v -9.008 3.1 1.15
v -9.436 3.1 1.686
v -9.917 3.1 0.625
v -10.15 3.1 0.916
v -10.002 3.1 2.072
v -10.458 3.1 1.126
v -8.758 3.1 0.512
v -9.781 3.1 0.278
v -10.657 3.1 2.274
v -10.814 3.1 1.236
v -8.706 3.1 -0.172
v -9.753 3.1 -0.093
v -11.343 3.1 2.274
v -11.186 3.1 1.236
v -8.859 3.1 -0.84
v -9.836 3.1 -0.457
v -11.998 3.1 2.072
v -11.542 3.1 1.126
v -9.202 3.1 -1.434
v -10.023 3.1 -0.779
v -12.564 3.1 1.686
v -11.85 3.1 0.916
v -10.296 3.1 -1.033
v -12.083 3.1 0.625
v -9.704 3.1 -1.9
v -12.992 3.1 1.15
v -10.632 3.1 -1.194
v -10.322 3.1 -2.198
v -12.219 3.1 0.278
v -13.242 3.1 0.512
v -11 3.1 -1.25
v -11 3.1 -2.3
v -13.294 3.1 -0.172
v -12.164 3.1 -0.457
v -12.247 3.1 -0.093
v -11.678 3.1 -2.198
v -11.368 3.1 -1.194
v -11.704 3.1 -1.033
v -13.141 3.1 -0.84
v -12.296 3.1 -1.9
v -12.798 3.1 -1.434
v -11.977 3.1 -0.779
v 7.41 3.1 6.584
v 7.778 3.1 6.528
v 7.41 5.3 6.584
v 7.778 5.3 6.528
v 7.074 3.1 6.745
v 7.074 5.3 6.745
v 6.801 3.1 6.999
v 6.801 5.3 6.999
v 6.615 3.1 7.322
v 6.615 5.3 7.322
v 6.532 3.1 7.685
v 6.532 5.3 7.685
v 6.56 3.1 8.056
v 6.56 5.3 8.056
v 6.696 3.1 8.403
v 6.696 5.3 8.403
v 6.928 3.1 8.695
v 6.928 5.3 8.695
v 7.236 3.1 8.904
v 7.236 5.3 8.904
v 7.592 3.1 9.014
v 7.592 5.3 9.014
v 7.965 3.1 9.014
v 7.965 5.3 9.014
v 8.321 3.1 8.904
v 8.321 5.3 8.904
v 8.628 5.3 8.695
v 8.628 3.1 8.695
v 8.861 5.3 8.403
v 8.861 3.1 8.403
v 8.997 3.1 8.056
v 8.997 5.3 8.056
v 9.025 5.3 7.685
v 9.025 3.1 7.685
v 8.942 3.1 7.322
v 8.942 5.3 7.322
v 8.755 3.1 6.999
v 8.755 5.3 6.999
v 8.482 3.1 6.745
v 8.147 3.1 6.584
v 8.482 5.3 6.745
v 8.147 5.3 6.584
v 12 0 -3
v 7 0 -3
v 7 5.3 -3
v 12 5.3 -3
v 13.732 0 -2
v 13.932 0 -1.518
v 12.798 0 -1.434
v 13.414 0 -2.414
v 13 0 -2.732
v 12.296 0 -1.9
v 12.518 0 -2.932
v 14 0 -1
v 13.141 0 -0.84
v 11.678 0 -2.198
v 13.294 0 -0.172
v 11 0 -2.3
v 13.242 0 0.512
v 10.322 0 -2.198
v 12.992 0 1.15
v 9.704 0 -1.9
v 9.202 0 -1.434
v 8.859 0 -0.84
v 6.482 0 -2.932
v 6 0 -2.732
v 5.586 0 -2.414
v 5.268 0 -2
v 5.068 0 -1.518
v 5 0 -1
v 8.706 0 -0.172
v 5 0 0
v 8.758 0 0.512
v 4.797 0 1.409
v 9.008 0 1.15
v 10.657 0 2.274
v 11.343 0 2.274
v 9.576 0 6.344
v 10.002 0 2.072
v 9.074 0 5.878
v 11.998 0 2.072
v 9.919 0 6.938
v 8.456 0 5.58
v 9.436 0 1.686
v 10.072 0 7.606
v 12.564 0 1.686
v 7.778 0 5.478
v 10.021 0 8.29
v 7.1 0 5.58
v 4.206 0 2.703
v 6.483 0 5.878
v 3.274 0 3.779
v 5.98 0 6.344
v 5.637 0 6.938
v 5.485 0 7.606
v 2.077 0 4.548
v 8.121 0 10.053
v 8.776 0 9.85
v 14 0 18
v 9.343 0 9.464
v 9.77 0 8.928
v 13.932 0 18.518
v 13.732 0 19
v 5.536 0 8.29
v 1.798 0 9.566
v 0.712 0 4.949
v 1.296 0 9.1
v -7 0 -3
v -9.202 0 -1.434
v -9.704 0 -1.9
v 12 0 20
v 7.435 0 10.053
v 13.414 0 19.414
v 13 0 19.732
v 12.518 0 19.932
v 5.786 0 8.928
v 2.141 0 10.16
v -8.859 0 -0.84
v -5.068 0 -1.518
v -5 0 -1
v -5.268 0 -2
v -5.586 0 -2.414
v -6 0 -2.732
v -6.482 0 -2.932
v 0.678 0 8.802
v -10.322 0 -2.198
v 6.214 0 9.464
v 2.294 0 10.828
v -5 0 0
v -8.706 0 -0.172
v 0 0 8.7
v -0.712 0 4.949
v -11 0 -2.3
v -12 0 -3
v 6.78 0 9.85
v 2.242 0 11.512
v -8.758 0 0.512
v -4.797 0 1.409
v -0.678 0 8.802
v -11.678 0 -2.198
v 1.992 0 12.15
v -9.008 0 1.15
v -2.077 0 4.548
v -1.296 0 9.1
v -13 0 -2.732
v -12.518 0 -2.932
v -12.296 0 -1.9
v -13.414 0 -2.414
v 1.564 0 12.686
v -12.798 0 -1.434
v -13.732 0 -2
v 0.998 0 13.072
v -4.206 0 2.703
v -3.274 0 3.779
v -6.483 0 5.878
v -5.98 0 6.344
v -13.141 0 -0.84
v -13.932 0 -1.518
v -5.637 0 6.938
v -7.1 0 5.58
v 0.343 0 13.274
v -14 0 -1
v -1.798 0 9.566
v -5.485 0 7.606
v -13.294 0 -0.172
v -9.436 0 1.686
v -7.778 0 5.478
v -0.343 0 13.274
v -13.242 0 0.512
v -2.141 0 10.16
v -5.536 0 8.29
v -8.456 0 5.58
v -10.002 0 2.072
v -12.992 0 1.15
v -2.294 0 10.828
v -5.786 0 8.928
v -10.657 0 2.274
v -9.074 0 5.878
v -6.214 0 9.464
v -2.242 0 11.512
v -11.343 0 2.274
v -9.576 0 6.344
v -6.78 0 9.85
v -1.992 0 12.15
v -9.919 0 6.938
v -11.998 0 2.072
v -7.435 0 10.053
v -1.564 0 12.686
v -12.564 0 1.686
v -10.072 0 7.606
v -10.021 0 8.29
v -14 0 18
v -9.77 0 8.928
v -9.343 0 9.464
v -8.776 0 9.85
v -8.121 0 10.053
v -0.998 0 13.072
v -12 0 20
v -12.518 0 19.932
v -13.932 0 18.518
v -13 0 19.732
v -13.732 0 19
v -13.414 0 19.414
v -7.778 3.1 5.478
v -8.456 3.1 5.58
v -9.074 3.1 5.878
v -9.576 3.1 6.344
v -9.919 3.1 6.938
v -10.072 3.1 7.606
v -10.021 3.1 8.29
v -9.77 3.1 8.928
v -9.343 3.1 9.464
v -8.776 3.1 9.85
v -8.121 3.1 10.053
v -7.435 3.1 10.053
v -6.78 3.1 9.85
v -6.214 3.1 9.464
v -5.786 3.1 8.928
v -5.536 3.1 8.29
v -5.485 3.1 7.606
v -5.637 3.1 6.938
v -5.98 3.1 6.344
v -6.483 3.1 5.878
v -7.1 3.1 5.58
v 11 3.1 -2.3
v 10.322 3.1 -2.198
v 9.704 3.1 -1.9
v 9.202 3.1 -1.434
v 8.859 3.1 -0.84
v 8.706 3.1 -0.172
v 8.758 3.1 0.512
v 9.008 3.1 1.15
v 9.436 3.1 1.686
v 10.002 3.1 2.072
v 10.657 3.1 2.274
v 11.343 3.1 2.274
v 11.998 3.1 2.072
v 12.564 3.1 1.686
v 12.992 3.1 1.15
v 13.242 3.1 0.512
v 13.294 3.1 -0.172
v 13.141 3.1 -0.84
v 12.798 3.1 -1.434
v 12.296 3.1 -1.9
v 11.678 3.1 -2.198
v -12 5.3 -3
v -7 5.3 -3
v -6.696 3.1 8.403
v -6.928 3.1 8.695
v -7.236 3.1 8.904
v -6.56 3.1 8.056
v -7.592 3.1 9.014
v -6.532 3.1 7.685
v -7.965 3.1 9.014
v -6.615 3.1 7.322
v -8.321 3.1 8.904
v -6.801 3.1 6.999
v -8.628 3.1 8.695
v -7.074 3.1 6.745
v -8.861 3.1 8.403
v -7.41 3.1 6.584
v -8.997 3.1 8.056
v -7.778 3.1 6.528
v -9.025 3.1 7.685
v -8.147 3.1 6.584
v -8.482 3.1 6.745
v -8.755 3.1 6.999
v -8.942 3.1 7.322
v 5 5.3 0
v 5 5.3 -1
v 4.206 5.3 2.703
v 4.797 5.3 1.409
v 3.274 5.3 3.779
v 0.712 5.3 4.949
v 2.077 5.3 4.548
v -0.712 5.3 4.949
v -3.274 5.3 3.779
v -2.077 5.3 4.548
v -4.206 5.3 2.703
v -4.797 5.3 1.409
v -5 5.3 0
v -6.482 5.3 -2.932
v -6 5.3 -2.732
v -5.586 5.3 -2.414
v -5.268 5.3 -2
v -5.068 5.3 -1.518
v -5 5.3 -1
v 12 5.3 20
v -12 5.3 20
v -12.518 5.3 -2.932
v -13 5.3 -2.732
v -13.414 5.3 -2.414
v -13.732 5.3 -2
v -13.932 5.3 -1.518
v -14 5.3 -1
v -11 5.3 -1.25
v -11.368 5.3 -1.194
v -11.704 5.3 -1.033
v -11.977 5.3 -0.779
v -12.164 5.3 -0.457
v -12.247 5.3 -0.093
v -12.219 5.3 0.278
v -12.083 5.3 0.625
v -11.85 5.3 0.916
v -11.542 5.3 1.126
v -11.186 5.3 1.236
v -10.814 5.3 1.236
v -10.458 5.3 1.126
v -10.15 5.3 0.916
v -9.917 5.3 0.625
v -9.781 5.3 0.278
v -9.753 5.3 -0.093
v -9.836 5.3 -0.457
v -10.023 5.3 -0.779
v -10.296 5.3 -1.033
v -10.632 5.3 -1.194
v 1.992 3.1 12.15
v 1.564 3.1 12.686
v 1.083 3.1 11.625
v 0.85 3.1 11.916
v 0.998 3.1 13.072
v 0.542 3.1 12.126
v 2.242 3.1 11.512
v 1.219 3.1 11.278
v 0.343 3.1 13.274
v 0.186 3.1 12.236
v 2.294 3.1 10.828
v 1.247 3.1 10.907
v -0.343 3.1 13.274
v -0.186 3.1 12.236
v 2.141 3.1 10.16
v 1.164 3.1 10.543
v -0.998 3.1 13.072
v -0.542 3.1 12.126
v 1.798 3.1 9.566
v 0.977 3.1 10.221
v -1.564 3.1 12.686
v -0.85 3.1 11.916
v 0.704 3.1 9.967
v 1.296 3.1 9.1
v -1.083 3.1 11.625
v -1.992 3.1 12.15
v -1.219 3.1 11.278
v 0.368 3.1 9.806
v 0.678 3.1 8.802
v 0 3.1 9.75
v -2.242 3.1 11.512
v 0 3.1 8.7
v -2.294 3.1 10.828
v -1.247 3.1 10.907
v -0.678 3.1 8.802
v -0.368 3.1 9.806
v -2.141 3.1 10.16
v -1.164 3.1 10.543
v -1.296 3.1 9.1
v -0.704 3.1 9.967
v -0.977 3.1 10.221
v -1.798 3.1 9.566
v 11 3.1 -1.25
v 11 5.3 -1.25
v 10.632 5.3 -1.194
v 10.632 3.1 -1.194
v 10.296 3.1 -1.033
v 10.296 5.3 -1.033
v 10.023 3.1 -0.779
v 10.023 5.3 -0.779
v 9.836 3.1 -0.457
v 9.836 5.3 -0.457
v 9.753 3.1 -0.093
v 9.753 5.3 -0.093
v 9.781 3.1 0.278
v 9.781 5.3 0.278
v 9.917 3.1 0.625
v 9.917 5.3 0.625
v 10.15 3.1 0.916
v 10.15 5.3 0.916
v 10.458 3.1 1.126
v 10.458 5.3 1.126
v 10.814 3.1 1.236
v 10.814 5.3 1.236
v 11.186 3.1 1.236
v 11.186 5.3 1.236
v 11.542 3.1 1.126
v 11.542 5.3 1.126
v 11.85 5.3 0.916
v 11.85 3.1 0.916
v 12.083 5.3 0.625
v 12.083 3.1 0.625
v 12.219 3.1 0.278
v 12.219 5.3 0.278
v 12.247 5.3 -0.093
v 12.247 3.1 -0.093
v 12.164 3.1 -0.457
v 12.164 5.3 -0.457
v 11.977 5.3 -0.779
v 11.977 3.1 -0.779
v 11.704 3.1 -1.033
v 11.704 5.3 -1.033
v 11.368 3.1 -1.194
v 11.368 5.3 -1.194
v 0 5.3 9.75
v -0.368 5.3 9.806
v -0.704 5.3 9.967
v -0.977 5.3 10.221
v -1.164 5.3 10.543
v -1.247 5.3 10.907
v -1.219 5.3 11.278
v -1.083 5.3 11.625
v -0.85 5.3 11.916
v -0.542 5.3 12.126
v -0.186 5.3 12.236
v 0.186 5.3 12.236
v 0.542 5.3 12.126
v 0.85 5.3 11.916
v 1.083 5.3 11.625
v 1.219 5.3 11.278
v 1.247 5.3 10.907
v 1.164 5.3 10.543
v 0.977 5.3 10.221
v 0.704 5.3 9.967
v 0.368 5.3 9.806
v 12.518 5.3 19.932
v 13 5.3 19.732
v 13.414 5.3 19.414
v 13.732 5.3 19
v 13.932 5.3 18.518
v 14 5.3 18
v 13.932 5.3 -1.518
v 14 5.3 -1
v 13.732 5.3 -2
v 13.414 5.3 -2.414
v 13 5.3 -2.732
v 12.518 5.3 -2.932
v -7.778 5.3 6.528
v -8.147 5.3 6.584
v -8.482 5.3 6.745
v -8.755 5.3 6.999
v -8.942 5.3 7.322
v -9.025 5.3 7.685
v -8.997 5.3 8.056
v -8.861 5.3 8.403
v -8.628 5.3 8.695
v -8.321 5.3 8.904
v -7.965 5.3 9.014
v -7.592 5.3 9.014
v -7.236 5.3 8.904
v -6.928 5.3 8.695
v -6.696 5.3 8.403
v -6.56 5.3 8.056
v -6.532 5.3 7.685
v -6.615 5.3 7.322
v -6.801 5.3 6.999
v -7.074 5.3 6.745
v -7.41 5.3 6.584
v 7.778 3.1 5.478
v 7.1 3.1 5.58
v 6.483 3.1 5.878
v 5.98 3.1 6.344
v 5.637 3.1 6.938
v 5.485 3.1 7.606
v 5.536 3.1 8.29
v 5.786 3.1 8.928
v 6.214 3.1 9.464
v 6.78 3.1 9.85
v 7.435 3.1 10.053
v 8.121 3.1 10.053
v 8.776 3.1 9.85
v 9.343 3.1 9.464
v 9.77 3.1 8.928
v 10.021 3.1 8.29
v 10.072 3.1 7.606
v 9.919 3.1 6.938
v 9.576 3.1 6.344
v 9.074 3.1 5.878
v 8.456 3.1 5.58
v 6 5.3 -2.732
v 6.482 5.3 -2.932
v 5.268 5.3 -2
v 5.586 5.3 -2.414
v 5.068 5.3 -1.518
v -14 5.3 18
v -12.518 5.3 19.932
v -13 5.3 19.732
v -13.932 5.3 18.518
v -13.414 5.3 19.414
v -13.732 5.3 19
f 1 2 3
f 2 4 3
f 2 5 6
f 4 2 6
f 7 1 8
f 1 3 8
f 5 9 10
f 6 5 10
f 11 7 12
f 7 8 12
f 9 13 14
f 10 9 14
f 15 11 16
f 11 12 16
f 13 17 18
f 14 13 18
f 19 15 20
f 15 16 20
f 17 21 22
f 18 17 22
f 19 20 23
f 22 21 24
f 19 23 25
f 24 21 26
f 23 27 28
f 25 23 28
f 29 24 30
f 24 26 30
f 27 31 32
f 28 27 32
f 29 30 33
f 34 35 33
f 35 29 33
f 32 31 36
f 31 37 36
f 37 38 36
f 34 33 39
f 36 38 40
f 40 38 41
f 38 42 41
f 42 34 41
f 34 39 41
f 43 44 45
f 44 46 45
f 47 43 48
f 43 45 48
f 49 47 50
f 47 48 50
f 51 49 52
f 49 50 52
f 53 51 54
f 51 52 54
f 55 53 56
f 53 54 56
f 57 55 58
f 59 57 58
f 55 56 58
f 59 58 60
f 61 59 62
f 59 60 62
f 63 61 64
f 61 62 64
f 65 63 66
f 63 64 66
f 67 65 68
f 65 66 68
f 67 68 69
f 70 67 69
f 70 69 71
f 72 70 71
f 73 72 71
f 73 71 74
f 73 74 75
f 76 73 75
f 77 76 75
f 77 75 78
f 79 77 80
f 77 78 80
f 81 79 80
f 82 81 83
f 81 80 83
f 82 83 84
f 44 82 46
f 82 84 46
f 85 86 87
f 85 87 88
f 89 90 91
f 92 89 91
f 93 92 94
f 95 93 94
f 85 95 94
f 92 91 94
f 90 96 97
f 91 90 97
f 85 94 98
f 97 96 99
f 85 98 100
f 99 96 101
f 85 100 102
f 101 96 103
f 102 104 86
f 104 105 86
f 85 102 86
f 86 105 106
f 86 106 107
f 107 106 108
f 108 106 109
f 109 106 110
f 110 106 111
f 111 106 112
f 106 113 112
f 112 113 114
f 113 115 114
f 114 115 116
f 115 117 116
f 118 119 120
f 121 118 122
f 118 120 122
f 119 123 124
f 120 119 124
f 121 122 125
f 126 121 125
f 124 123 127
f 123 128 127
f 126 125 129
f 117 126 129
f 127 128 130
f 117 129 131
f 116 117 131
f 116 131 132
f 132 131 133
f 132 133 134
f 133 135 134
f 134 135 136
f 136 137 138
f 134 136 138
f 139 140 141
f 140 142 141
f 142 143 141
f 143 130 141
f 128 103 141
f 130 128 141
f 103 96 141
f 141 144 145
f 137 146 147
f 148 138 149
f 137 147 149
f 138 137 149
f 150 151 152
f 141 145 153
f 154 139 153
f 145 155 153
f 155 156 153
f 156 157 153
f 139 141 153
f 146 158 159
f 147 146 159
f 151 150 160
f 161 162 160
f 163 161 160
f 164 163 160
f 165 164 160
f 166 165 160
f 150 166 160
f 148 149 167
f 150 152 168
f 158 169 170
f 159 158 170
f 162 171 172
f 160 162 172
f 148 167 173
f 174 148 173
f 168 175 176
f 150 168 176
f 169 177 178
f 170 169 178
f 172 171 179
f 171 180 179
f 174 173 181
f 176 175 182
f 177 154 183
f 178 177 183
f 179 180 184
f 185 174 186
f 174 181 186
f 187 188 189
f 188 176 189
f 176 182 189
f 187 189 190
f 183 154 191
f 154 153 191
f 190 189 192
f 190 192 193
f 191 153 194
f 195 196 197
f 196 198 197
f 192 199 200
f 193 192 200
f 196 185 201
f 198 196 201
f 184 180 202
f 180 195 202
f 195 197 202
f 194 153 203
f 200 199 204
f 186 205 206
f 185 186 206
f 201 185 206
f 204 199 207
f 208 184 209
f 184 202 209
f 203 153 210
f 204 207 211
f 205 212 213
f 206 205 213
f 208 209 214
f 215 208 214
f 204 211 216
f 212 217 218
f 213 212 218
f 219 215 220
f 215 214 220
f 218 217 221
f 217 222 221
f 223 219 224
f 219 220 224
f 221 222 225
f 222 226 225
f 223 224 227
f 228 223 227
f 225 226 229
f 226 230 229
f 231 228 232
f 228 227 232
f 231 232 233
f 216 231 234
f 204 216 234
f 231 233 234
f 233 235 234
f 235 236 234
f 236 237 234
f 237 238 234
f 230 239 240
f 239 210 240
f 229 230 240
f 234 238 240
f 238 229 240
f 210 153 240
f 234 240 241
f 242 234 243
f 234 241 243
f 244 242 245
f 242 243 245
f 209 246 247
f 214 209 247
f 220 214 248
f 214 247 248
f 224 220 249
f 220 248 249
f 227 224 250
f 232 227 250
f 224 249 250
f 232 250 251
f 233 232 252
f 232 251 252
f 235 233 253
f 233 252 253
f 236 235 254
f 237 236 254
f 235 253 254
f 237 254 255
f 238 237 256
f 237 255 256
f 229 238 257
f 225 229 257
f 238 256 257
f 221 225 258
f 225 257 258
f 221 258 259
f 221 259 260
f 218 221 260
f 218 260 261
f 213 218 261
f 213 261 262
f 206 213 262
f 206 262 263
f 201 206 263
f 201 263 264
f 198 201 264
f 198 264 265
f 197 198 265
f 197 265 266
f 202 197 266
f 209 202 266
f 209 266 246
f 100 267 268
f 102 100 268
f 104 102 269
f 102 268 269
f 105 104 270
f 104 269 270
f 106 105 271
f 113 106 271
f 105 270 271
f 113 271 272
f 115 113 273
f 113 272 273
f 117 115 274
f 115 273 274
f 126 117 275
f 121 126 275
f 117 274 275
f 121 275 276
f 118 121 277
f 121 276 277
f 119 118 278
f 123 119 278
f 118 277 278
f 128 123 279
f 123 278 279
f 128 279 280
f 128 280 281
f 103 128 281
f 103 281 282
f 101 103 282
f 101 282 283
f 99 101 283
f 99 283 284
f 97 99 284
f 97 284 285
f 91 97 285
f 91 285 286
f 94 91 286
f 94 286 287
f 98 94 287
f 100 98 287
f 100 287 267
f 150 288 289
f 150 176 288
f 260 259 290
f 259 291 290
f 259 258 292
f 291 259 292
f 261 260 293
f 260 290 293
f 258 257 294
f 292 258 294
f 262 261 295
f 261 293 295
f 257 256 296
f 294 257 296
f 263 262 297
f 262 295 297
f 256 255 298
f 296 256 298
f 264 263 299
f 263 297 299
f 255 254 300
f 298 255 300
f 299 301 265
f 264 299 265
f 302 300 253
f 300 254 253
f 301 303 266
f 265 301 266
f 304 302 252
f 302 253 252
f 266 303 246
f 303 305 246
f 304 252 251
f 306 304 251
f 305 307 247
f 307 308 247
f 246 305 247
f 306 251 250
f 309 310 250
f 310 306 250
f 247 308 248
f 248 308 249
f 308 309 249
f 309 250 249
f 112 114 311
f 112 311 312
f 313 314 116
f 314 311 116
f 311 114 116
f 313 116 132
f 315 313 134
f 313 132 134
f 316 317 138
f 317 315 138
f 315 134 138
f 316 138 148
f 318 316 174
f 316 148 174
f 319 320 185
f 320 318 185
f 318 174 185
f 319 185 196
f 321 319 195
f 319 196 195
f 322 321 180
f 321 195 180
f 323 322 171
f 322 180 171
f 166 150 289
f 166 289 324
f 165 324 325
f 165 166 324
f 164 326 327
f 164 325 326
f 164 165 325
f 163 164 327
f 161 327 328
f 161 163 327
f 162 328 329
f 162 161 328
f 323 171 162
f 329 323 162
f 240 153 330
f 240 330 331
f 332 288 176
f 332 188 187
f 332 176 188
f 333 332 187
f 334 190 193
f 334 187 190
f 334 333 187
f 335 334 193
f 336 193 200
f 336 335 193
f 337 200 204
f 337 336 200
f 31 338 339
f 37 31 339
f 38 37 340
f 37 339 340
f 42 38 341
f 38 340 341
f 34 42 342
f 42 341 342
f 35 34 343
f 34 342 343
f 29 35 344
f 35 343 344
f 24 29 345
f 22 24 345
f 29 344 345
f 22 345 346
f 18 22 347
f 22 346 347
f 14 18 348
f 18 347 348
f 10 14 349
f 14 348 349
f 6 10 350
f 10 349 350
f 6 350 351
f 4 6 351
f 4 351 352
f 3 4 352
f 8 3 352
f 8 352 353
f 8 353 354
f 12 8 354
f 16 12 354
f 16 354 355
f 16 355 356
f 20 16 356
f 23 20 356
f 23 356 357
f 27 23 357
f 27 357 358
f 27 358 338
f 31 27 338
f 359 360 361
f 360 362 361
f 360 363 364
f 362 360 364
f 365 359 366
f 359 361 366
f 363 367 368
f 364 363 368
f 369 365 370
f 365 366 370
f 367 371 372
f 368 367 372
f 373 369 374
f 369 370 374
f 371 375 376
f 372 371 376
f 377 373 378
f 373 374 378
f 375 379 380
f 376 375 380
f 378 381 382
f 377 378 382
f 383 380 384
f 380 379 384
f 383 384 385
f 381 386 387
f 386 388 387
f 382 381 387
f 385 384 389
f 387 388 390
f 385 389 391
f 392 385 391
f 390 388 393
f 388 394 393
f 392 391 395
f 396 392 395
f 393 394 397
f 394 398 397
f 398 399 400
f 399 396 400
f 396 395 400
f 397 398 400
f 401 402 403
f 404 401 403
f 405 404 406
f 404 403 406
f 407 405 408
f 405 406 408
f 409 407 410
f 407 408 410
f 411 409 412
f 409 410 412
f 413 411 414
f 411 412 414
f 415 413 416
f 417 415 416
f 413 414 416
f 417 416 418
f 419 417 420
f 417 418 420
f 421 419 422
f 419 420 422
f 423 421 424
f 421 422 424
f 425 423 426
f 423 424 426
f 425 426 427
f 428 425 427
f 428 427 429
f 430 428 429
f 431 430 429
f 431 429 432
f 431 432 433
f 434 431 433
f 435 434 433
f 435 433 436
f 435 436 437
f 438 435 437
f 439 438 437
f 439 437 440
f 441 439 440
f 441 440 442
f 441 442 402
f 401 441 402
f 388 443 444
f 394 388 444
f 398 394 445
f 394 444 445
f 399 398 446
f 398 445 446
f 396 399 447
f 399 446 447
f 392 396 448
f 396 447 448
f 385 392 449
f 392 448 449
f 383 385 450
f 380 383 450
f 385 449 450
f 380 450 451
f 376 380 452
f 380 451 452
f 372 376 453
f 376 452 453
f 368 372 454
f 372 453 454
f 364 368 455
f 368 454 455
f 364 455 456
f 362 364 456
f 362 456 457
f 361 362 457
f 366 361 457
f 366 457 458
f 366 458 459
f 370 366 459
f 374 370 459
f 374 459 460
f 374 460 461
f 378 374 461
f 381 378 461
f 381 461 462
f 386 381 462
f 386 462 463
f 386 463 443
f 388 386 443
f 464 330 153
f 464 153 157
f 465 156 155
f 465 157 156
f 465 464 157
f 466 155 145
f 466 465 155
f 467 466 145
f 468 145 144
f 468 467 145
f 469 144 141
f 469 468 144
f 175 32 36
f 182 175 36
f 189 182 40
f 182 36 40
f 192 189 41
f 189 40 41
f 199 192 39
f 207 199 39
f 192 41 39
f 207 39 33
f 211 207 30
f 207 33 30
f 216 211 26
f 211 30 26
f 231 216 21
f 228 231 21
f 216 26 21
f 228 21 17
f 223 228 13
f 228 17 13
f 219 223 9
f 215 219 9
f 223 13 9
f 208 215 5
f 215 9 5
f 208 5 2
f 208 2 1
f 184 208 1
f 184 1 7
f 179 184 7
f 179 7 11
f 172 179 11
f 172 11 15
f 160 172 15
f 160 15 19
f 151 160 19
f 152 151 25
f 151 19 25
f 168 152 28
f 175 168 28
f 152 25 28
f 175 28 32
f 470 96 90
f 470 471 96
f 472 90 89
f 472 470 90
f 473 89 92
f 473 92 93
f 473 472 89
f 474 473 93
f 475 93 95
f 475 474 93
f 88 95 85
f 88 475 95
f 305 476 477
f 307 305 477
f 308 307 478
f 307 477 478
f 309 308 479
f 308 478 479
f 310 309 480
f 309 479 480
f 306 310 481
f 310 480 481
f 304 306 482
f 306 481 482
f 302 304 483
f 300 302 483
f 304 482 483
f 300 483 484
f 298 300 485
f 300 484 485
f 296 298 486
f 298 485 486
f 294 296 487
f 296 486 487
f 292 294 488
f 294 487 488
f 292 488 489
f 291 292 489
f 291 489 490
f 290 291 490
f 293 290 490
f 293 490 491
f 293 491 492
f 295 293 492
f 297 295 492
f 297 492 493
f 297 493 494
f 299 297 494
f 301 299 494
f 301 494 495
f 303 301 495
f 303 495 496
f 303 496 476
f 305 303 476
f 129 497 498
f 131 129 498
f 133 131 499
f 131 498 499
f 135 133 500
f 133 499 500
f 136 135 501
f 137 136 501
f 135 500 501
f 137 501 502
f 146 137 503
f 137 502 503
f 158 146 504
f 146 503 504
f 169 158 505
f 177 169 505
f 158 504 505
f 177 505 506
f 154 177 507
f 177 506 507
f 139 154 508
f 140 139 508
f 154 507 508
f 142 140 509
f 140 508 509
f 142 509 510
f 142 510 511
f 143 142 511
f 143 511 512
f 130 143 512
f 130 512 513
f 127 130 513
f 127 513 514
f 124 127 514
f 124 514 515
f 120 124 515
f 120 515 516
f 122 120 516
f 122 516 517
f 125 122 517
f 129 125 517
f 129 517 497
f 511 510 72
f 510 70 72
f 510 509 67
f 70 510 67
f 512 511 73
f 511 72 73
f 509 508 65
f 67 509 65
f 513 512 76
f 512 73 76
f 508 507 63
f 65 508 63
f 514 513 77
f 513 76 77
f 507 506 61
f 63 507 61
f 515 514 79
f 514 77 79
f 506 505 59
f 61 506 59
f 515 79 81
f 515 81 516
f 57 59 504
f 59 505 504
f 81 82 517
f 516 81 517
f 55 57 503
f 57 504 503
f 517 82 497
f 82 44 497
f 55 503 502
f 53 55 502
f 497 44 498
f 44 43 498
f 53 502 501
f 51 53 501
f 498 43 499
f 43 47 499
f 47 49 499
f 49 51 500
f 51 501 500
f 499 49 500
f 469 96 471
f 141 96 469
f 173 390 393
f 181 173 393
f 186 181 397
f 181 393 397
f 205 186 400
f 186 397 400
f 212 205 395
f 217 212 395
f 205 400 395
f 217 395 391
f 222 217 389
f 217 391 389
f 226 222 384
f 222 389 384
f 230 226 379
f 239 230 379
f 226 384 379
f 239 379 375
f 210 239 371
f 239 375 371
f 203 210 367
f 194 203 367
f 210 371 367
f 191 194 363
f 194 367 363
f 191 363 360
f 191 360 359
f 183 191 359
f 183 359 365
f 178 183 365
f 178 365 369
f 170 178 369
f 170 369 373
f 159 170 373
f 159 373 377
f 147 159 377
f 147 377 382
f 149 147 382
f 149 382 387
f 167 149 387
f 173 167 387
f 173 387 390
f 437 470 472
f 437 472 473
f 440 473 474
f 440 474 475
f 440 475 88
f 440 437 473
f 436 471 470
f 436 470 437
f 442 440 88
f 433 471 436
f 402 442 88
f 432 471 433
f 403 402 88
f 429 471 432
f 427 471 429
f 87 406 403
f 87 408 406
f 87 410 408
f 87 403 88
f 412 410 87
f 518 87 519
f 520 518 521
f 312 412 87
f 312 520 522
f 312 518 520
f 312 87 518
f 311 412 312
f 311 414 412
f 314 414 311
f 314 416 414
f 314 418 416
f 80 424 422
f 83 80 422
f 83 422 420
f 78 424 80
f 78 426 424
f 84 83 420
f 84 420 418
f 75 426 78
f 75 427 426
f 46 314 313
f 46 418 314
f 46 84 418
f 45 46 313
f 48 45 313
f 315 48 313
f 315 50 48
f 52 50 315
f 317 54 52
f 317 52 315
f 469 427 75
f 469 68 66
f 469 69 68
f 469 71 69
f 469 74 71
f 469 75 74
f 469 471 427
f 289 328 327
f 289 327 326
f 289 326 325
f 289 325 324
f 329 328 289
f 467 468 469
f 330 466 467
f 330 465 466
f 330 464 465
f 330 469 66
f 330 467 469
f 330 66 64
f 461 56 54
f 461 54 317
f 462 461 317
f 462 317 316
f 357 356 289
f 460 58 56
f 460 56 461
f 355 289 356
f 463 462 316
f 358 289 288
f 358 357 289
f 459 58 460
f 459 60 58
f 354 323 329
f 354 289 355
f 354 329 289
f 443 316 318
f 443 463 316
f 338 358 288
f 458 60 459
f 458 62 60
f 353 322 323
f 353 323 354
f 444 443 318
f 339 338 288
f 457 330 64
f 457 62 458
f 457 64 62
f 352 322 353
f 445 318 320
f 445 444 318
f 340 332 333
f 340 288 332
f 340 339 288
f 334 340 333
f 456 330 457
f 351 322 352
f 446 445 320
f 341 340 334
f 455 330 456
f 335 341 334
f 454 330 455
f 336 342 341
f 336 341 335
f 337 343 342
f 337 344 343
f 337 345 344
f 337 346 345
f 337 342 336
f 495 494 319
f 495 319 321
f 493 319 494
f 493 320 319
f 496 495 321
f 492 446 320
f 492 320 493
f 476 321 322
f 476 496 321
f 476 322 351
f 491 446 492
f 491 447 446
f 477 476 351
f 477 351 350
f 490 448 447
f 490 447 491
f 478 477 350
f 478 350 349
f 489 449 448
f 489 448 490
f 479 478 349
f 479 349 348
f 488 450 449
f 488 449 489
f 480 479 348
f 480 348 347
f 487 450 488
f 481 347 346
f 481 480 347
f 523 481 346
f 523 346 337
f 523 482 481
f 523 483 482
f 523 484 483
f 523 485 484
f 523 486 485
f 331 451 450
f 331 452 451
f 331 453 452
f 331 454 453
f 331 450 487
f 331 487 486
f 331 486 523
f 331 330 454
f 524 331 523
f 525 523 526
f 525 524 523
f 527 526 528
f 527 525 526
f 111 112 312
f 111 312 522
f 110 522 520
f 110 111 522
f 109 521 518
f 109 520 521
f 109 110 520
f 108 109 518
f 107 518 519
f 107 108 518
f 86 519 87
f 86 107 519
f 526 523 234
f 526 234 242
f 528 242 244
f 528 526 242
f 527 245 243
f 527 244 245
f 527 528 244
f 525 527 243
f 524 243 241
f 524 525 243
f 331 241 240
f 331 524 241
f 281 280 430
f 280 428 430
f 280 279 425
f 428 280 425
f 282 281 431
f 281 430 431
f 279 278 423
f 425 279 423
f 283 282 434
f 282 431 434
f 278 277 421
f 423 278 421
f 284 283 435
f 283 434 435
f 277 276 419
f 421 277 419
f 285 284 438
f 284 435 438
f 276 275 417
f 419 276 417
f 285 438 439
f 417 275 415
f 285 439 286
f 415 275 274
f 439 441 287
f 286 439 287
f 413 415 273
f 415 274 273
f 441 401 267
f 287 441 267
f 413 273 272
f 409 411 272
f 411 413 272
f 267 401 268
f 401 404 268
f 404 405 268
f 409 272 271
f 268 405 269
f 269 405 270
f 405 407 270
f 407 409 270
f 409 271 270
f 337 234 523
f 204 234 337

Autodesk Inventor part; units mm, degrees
ref_plane "YZ Plane" through (0, 0, 0) normal (1, 0, 0) x (0, 1, 0)
ref_plane "XZ Plane" through (0, 0, 0) normal (0, 1, 0) x (-1, 0, 0)
ref_plane "XY Plane" through (0, 0, 0) normal (0, 0, 1) x (1, 0, 0)
sketch "Sketch1" plane through (0, 0, 0) normal (0, 1, 0) x (-1, 0, 0)
  line L0 (14, 0) -> (-14, 0) construction
  line L1 (-14, 0) -> (-14, 20)
  line L2 (-14, 20) -> (14, 20)
  line L3 (14, 20) -> (14, 0)
  circle A0 centre (0, 0) radius 5
  line L4 (14, 0) -> (14, -3)
  line L5 (14, -3) -> (4, -3)
  line L6 (-14, -3) -> (-14, 0)
  line L7 (9.8995, 9.8995) -> (-9.8995, -9.8995) construction
  line L8 (0, 14) -> (0, -14) construction
  line L9 (-9.8995, 9.8995) -> (9.8995, -9.8995) construction
  line L10 (-14, 0) -> (14, 0) construction
  line L11 (-4, -3) -> (-14, -3)
  line L12 (4, -3) -> (-4, -3) construction
  line L13 (5, 0) -> (5, -1)
  line L14 (-5, 0) -> (-5, -1)
  arc A1 (-7, -3) -> (-5, -1) centre (-7, -1) ccw
  arc A2 (5, -1) -> (7, -3) centre (7, -1) ccw
  point P0 (11, 0)
  point P1 (7.7782, 7.7782)
  point P2 (0, 11)
  point P3 (-7.7782, 7.7782)
  point P4 (-11, 0)
  dimension "d0" = 28
  dimension "d1" = 10
  dimension "d2" = 20
  dimension "d3" = 3
  dimension "d4" = 11
  dimension "d7" = 180
  dimension "d20" = 1
extrude "Extrusion1" add sketch "Sketch1" along normal blind 5.3 contours L1 L2 L3 L4 L5 A2 L13 A0 L14 A1 L11 L6
hole "Hole1" at (-11, 0, 0) at (-7.7782, 0, 7.7782) at (0, 0, 11) at (7.7782, 0, 7.7782) at (11, 0, 0) direction (0, 1, 0) diameter 2.5 end through all counterbore diameter 4.6 counterbore depth 3.1
fillet "Fillet2" radius 2 4 edges at (-14, 2.65, -3) (-14, 2.65, 20) (14, 2.65, 20) (14, 2.65, -3)
equation "\"d9\" = teflon_thickness"
equation "\"d13\" = trace_radius"
equation "\"d14\" = trace_depth"
equation "\"teflon_thickness\" = 5.3"
equation "\"trace_radius\" = 4.6"
equation "\"trace_depth\" = 3.1"
properties part number "elbow_protection"
